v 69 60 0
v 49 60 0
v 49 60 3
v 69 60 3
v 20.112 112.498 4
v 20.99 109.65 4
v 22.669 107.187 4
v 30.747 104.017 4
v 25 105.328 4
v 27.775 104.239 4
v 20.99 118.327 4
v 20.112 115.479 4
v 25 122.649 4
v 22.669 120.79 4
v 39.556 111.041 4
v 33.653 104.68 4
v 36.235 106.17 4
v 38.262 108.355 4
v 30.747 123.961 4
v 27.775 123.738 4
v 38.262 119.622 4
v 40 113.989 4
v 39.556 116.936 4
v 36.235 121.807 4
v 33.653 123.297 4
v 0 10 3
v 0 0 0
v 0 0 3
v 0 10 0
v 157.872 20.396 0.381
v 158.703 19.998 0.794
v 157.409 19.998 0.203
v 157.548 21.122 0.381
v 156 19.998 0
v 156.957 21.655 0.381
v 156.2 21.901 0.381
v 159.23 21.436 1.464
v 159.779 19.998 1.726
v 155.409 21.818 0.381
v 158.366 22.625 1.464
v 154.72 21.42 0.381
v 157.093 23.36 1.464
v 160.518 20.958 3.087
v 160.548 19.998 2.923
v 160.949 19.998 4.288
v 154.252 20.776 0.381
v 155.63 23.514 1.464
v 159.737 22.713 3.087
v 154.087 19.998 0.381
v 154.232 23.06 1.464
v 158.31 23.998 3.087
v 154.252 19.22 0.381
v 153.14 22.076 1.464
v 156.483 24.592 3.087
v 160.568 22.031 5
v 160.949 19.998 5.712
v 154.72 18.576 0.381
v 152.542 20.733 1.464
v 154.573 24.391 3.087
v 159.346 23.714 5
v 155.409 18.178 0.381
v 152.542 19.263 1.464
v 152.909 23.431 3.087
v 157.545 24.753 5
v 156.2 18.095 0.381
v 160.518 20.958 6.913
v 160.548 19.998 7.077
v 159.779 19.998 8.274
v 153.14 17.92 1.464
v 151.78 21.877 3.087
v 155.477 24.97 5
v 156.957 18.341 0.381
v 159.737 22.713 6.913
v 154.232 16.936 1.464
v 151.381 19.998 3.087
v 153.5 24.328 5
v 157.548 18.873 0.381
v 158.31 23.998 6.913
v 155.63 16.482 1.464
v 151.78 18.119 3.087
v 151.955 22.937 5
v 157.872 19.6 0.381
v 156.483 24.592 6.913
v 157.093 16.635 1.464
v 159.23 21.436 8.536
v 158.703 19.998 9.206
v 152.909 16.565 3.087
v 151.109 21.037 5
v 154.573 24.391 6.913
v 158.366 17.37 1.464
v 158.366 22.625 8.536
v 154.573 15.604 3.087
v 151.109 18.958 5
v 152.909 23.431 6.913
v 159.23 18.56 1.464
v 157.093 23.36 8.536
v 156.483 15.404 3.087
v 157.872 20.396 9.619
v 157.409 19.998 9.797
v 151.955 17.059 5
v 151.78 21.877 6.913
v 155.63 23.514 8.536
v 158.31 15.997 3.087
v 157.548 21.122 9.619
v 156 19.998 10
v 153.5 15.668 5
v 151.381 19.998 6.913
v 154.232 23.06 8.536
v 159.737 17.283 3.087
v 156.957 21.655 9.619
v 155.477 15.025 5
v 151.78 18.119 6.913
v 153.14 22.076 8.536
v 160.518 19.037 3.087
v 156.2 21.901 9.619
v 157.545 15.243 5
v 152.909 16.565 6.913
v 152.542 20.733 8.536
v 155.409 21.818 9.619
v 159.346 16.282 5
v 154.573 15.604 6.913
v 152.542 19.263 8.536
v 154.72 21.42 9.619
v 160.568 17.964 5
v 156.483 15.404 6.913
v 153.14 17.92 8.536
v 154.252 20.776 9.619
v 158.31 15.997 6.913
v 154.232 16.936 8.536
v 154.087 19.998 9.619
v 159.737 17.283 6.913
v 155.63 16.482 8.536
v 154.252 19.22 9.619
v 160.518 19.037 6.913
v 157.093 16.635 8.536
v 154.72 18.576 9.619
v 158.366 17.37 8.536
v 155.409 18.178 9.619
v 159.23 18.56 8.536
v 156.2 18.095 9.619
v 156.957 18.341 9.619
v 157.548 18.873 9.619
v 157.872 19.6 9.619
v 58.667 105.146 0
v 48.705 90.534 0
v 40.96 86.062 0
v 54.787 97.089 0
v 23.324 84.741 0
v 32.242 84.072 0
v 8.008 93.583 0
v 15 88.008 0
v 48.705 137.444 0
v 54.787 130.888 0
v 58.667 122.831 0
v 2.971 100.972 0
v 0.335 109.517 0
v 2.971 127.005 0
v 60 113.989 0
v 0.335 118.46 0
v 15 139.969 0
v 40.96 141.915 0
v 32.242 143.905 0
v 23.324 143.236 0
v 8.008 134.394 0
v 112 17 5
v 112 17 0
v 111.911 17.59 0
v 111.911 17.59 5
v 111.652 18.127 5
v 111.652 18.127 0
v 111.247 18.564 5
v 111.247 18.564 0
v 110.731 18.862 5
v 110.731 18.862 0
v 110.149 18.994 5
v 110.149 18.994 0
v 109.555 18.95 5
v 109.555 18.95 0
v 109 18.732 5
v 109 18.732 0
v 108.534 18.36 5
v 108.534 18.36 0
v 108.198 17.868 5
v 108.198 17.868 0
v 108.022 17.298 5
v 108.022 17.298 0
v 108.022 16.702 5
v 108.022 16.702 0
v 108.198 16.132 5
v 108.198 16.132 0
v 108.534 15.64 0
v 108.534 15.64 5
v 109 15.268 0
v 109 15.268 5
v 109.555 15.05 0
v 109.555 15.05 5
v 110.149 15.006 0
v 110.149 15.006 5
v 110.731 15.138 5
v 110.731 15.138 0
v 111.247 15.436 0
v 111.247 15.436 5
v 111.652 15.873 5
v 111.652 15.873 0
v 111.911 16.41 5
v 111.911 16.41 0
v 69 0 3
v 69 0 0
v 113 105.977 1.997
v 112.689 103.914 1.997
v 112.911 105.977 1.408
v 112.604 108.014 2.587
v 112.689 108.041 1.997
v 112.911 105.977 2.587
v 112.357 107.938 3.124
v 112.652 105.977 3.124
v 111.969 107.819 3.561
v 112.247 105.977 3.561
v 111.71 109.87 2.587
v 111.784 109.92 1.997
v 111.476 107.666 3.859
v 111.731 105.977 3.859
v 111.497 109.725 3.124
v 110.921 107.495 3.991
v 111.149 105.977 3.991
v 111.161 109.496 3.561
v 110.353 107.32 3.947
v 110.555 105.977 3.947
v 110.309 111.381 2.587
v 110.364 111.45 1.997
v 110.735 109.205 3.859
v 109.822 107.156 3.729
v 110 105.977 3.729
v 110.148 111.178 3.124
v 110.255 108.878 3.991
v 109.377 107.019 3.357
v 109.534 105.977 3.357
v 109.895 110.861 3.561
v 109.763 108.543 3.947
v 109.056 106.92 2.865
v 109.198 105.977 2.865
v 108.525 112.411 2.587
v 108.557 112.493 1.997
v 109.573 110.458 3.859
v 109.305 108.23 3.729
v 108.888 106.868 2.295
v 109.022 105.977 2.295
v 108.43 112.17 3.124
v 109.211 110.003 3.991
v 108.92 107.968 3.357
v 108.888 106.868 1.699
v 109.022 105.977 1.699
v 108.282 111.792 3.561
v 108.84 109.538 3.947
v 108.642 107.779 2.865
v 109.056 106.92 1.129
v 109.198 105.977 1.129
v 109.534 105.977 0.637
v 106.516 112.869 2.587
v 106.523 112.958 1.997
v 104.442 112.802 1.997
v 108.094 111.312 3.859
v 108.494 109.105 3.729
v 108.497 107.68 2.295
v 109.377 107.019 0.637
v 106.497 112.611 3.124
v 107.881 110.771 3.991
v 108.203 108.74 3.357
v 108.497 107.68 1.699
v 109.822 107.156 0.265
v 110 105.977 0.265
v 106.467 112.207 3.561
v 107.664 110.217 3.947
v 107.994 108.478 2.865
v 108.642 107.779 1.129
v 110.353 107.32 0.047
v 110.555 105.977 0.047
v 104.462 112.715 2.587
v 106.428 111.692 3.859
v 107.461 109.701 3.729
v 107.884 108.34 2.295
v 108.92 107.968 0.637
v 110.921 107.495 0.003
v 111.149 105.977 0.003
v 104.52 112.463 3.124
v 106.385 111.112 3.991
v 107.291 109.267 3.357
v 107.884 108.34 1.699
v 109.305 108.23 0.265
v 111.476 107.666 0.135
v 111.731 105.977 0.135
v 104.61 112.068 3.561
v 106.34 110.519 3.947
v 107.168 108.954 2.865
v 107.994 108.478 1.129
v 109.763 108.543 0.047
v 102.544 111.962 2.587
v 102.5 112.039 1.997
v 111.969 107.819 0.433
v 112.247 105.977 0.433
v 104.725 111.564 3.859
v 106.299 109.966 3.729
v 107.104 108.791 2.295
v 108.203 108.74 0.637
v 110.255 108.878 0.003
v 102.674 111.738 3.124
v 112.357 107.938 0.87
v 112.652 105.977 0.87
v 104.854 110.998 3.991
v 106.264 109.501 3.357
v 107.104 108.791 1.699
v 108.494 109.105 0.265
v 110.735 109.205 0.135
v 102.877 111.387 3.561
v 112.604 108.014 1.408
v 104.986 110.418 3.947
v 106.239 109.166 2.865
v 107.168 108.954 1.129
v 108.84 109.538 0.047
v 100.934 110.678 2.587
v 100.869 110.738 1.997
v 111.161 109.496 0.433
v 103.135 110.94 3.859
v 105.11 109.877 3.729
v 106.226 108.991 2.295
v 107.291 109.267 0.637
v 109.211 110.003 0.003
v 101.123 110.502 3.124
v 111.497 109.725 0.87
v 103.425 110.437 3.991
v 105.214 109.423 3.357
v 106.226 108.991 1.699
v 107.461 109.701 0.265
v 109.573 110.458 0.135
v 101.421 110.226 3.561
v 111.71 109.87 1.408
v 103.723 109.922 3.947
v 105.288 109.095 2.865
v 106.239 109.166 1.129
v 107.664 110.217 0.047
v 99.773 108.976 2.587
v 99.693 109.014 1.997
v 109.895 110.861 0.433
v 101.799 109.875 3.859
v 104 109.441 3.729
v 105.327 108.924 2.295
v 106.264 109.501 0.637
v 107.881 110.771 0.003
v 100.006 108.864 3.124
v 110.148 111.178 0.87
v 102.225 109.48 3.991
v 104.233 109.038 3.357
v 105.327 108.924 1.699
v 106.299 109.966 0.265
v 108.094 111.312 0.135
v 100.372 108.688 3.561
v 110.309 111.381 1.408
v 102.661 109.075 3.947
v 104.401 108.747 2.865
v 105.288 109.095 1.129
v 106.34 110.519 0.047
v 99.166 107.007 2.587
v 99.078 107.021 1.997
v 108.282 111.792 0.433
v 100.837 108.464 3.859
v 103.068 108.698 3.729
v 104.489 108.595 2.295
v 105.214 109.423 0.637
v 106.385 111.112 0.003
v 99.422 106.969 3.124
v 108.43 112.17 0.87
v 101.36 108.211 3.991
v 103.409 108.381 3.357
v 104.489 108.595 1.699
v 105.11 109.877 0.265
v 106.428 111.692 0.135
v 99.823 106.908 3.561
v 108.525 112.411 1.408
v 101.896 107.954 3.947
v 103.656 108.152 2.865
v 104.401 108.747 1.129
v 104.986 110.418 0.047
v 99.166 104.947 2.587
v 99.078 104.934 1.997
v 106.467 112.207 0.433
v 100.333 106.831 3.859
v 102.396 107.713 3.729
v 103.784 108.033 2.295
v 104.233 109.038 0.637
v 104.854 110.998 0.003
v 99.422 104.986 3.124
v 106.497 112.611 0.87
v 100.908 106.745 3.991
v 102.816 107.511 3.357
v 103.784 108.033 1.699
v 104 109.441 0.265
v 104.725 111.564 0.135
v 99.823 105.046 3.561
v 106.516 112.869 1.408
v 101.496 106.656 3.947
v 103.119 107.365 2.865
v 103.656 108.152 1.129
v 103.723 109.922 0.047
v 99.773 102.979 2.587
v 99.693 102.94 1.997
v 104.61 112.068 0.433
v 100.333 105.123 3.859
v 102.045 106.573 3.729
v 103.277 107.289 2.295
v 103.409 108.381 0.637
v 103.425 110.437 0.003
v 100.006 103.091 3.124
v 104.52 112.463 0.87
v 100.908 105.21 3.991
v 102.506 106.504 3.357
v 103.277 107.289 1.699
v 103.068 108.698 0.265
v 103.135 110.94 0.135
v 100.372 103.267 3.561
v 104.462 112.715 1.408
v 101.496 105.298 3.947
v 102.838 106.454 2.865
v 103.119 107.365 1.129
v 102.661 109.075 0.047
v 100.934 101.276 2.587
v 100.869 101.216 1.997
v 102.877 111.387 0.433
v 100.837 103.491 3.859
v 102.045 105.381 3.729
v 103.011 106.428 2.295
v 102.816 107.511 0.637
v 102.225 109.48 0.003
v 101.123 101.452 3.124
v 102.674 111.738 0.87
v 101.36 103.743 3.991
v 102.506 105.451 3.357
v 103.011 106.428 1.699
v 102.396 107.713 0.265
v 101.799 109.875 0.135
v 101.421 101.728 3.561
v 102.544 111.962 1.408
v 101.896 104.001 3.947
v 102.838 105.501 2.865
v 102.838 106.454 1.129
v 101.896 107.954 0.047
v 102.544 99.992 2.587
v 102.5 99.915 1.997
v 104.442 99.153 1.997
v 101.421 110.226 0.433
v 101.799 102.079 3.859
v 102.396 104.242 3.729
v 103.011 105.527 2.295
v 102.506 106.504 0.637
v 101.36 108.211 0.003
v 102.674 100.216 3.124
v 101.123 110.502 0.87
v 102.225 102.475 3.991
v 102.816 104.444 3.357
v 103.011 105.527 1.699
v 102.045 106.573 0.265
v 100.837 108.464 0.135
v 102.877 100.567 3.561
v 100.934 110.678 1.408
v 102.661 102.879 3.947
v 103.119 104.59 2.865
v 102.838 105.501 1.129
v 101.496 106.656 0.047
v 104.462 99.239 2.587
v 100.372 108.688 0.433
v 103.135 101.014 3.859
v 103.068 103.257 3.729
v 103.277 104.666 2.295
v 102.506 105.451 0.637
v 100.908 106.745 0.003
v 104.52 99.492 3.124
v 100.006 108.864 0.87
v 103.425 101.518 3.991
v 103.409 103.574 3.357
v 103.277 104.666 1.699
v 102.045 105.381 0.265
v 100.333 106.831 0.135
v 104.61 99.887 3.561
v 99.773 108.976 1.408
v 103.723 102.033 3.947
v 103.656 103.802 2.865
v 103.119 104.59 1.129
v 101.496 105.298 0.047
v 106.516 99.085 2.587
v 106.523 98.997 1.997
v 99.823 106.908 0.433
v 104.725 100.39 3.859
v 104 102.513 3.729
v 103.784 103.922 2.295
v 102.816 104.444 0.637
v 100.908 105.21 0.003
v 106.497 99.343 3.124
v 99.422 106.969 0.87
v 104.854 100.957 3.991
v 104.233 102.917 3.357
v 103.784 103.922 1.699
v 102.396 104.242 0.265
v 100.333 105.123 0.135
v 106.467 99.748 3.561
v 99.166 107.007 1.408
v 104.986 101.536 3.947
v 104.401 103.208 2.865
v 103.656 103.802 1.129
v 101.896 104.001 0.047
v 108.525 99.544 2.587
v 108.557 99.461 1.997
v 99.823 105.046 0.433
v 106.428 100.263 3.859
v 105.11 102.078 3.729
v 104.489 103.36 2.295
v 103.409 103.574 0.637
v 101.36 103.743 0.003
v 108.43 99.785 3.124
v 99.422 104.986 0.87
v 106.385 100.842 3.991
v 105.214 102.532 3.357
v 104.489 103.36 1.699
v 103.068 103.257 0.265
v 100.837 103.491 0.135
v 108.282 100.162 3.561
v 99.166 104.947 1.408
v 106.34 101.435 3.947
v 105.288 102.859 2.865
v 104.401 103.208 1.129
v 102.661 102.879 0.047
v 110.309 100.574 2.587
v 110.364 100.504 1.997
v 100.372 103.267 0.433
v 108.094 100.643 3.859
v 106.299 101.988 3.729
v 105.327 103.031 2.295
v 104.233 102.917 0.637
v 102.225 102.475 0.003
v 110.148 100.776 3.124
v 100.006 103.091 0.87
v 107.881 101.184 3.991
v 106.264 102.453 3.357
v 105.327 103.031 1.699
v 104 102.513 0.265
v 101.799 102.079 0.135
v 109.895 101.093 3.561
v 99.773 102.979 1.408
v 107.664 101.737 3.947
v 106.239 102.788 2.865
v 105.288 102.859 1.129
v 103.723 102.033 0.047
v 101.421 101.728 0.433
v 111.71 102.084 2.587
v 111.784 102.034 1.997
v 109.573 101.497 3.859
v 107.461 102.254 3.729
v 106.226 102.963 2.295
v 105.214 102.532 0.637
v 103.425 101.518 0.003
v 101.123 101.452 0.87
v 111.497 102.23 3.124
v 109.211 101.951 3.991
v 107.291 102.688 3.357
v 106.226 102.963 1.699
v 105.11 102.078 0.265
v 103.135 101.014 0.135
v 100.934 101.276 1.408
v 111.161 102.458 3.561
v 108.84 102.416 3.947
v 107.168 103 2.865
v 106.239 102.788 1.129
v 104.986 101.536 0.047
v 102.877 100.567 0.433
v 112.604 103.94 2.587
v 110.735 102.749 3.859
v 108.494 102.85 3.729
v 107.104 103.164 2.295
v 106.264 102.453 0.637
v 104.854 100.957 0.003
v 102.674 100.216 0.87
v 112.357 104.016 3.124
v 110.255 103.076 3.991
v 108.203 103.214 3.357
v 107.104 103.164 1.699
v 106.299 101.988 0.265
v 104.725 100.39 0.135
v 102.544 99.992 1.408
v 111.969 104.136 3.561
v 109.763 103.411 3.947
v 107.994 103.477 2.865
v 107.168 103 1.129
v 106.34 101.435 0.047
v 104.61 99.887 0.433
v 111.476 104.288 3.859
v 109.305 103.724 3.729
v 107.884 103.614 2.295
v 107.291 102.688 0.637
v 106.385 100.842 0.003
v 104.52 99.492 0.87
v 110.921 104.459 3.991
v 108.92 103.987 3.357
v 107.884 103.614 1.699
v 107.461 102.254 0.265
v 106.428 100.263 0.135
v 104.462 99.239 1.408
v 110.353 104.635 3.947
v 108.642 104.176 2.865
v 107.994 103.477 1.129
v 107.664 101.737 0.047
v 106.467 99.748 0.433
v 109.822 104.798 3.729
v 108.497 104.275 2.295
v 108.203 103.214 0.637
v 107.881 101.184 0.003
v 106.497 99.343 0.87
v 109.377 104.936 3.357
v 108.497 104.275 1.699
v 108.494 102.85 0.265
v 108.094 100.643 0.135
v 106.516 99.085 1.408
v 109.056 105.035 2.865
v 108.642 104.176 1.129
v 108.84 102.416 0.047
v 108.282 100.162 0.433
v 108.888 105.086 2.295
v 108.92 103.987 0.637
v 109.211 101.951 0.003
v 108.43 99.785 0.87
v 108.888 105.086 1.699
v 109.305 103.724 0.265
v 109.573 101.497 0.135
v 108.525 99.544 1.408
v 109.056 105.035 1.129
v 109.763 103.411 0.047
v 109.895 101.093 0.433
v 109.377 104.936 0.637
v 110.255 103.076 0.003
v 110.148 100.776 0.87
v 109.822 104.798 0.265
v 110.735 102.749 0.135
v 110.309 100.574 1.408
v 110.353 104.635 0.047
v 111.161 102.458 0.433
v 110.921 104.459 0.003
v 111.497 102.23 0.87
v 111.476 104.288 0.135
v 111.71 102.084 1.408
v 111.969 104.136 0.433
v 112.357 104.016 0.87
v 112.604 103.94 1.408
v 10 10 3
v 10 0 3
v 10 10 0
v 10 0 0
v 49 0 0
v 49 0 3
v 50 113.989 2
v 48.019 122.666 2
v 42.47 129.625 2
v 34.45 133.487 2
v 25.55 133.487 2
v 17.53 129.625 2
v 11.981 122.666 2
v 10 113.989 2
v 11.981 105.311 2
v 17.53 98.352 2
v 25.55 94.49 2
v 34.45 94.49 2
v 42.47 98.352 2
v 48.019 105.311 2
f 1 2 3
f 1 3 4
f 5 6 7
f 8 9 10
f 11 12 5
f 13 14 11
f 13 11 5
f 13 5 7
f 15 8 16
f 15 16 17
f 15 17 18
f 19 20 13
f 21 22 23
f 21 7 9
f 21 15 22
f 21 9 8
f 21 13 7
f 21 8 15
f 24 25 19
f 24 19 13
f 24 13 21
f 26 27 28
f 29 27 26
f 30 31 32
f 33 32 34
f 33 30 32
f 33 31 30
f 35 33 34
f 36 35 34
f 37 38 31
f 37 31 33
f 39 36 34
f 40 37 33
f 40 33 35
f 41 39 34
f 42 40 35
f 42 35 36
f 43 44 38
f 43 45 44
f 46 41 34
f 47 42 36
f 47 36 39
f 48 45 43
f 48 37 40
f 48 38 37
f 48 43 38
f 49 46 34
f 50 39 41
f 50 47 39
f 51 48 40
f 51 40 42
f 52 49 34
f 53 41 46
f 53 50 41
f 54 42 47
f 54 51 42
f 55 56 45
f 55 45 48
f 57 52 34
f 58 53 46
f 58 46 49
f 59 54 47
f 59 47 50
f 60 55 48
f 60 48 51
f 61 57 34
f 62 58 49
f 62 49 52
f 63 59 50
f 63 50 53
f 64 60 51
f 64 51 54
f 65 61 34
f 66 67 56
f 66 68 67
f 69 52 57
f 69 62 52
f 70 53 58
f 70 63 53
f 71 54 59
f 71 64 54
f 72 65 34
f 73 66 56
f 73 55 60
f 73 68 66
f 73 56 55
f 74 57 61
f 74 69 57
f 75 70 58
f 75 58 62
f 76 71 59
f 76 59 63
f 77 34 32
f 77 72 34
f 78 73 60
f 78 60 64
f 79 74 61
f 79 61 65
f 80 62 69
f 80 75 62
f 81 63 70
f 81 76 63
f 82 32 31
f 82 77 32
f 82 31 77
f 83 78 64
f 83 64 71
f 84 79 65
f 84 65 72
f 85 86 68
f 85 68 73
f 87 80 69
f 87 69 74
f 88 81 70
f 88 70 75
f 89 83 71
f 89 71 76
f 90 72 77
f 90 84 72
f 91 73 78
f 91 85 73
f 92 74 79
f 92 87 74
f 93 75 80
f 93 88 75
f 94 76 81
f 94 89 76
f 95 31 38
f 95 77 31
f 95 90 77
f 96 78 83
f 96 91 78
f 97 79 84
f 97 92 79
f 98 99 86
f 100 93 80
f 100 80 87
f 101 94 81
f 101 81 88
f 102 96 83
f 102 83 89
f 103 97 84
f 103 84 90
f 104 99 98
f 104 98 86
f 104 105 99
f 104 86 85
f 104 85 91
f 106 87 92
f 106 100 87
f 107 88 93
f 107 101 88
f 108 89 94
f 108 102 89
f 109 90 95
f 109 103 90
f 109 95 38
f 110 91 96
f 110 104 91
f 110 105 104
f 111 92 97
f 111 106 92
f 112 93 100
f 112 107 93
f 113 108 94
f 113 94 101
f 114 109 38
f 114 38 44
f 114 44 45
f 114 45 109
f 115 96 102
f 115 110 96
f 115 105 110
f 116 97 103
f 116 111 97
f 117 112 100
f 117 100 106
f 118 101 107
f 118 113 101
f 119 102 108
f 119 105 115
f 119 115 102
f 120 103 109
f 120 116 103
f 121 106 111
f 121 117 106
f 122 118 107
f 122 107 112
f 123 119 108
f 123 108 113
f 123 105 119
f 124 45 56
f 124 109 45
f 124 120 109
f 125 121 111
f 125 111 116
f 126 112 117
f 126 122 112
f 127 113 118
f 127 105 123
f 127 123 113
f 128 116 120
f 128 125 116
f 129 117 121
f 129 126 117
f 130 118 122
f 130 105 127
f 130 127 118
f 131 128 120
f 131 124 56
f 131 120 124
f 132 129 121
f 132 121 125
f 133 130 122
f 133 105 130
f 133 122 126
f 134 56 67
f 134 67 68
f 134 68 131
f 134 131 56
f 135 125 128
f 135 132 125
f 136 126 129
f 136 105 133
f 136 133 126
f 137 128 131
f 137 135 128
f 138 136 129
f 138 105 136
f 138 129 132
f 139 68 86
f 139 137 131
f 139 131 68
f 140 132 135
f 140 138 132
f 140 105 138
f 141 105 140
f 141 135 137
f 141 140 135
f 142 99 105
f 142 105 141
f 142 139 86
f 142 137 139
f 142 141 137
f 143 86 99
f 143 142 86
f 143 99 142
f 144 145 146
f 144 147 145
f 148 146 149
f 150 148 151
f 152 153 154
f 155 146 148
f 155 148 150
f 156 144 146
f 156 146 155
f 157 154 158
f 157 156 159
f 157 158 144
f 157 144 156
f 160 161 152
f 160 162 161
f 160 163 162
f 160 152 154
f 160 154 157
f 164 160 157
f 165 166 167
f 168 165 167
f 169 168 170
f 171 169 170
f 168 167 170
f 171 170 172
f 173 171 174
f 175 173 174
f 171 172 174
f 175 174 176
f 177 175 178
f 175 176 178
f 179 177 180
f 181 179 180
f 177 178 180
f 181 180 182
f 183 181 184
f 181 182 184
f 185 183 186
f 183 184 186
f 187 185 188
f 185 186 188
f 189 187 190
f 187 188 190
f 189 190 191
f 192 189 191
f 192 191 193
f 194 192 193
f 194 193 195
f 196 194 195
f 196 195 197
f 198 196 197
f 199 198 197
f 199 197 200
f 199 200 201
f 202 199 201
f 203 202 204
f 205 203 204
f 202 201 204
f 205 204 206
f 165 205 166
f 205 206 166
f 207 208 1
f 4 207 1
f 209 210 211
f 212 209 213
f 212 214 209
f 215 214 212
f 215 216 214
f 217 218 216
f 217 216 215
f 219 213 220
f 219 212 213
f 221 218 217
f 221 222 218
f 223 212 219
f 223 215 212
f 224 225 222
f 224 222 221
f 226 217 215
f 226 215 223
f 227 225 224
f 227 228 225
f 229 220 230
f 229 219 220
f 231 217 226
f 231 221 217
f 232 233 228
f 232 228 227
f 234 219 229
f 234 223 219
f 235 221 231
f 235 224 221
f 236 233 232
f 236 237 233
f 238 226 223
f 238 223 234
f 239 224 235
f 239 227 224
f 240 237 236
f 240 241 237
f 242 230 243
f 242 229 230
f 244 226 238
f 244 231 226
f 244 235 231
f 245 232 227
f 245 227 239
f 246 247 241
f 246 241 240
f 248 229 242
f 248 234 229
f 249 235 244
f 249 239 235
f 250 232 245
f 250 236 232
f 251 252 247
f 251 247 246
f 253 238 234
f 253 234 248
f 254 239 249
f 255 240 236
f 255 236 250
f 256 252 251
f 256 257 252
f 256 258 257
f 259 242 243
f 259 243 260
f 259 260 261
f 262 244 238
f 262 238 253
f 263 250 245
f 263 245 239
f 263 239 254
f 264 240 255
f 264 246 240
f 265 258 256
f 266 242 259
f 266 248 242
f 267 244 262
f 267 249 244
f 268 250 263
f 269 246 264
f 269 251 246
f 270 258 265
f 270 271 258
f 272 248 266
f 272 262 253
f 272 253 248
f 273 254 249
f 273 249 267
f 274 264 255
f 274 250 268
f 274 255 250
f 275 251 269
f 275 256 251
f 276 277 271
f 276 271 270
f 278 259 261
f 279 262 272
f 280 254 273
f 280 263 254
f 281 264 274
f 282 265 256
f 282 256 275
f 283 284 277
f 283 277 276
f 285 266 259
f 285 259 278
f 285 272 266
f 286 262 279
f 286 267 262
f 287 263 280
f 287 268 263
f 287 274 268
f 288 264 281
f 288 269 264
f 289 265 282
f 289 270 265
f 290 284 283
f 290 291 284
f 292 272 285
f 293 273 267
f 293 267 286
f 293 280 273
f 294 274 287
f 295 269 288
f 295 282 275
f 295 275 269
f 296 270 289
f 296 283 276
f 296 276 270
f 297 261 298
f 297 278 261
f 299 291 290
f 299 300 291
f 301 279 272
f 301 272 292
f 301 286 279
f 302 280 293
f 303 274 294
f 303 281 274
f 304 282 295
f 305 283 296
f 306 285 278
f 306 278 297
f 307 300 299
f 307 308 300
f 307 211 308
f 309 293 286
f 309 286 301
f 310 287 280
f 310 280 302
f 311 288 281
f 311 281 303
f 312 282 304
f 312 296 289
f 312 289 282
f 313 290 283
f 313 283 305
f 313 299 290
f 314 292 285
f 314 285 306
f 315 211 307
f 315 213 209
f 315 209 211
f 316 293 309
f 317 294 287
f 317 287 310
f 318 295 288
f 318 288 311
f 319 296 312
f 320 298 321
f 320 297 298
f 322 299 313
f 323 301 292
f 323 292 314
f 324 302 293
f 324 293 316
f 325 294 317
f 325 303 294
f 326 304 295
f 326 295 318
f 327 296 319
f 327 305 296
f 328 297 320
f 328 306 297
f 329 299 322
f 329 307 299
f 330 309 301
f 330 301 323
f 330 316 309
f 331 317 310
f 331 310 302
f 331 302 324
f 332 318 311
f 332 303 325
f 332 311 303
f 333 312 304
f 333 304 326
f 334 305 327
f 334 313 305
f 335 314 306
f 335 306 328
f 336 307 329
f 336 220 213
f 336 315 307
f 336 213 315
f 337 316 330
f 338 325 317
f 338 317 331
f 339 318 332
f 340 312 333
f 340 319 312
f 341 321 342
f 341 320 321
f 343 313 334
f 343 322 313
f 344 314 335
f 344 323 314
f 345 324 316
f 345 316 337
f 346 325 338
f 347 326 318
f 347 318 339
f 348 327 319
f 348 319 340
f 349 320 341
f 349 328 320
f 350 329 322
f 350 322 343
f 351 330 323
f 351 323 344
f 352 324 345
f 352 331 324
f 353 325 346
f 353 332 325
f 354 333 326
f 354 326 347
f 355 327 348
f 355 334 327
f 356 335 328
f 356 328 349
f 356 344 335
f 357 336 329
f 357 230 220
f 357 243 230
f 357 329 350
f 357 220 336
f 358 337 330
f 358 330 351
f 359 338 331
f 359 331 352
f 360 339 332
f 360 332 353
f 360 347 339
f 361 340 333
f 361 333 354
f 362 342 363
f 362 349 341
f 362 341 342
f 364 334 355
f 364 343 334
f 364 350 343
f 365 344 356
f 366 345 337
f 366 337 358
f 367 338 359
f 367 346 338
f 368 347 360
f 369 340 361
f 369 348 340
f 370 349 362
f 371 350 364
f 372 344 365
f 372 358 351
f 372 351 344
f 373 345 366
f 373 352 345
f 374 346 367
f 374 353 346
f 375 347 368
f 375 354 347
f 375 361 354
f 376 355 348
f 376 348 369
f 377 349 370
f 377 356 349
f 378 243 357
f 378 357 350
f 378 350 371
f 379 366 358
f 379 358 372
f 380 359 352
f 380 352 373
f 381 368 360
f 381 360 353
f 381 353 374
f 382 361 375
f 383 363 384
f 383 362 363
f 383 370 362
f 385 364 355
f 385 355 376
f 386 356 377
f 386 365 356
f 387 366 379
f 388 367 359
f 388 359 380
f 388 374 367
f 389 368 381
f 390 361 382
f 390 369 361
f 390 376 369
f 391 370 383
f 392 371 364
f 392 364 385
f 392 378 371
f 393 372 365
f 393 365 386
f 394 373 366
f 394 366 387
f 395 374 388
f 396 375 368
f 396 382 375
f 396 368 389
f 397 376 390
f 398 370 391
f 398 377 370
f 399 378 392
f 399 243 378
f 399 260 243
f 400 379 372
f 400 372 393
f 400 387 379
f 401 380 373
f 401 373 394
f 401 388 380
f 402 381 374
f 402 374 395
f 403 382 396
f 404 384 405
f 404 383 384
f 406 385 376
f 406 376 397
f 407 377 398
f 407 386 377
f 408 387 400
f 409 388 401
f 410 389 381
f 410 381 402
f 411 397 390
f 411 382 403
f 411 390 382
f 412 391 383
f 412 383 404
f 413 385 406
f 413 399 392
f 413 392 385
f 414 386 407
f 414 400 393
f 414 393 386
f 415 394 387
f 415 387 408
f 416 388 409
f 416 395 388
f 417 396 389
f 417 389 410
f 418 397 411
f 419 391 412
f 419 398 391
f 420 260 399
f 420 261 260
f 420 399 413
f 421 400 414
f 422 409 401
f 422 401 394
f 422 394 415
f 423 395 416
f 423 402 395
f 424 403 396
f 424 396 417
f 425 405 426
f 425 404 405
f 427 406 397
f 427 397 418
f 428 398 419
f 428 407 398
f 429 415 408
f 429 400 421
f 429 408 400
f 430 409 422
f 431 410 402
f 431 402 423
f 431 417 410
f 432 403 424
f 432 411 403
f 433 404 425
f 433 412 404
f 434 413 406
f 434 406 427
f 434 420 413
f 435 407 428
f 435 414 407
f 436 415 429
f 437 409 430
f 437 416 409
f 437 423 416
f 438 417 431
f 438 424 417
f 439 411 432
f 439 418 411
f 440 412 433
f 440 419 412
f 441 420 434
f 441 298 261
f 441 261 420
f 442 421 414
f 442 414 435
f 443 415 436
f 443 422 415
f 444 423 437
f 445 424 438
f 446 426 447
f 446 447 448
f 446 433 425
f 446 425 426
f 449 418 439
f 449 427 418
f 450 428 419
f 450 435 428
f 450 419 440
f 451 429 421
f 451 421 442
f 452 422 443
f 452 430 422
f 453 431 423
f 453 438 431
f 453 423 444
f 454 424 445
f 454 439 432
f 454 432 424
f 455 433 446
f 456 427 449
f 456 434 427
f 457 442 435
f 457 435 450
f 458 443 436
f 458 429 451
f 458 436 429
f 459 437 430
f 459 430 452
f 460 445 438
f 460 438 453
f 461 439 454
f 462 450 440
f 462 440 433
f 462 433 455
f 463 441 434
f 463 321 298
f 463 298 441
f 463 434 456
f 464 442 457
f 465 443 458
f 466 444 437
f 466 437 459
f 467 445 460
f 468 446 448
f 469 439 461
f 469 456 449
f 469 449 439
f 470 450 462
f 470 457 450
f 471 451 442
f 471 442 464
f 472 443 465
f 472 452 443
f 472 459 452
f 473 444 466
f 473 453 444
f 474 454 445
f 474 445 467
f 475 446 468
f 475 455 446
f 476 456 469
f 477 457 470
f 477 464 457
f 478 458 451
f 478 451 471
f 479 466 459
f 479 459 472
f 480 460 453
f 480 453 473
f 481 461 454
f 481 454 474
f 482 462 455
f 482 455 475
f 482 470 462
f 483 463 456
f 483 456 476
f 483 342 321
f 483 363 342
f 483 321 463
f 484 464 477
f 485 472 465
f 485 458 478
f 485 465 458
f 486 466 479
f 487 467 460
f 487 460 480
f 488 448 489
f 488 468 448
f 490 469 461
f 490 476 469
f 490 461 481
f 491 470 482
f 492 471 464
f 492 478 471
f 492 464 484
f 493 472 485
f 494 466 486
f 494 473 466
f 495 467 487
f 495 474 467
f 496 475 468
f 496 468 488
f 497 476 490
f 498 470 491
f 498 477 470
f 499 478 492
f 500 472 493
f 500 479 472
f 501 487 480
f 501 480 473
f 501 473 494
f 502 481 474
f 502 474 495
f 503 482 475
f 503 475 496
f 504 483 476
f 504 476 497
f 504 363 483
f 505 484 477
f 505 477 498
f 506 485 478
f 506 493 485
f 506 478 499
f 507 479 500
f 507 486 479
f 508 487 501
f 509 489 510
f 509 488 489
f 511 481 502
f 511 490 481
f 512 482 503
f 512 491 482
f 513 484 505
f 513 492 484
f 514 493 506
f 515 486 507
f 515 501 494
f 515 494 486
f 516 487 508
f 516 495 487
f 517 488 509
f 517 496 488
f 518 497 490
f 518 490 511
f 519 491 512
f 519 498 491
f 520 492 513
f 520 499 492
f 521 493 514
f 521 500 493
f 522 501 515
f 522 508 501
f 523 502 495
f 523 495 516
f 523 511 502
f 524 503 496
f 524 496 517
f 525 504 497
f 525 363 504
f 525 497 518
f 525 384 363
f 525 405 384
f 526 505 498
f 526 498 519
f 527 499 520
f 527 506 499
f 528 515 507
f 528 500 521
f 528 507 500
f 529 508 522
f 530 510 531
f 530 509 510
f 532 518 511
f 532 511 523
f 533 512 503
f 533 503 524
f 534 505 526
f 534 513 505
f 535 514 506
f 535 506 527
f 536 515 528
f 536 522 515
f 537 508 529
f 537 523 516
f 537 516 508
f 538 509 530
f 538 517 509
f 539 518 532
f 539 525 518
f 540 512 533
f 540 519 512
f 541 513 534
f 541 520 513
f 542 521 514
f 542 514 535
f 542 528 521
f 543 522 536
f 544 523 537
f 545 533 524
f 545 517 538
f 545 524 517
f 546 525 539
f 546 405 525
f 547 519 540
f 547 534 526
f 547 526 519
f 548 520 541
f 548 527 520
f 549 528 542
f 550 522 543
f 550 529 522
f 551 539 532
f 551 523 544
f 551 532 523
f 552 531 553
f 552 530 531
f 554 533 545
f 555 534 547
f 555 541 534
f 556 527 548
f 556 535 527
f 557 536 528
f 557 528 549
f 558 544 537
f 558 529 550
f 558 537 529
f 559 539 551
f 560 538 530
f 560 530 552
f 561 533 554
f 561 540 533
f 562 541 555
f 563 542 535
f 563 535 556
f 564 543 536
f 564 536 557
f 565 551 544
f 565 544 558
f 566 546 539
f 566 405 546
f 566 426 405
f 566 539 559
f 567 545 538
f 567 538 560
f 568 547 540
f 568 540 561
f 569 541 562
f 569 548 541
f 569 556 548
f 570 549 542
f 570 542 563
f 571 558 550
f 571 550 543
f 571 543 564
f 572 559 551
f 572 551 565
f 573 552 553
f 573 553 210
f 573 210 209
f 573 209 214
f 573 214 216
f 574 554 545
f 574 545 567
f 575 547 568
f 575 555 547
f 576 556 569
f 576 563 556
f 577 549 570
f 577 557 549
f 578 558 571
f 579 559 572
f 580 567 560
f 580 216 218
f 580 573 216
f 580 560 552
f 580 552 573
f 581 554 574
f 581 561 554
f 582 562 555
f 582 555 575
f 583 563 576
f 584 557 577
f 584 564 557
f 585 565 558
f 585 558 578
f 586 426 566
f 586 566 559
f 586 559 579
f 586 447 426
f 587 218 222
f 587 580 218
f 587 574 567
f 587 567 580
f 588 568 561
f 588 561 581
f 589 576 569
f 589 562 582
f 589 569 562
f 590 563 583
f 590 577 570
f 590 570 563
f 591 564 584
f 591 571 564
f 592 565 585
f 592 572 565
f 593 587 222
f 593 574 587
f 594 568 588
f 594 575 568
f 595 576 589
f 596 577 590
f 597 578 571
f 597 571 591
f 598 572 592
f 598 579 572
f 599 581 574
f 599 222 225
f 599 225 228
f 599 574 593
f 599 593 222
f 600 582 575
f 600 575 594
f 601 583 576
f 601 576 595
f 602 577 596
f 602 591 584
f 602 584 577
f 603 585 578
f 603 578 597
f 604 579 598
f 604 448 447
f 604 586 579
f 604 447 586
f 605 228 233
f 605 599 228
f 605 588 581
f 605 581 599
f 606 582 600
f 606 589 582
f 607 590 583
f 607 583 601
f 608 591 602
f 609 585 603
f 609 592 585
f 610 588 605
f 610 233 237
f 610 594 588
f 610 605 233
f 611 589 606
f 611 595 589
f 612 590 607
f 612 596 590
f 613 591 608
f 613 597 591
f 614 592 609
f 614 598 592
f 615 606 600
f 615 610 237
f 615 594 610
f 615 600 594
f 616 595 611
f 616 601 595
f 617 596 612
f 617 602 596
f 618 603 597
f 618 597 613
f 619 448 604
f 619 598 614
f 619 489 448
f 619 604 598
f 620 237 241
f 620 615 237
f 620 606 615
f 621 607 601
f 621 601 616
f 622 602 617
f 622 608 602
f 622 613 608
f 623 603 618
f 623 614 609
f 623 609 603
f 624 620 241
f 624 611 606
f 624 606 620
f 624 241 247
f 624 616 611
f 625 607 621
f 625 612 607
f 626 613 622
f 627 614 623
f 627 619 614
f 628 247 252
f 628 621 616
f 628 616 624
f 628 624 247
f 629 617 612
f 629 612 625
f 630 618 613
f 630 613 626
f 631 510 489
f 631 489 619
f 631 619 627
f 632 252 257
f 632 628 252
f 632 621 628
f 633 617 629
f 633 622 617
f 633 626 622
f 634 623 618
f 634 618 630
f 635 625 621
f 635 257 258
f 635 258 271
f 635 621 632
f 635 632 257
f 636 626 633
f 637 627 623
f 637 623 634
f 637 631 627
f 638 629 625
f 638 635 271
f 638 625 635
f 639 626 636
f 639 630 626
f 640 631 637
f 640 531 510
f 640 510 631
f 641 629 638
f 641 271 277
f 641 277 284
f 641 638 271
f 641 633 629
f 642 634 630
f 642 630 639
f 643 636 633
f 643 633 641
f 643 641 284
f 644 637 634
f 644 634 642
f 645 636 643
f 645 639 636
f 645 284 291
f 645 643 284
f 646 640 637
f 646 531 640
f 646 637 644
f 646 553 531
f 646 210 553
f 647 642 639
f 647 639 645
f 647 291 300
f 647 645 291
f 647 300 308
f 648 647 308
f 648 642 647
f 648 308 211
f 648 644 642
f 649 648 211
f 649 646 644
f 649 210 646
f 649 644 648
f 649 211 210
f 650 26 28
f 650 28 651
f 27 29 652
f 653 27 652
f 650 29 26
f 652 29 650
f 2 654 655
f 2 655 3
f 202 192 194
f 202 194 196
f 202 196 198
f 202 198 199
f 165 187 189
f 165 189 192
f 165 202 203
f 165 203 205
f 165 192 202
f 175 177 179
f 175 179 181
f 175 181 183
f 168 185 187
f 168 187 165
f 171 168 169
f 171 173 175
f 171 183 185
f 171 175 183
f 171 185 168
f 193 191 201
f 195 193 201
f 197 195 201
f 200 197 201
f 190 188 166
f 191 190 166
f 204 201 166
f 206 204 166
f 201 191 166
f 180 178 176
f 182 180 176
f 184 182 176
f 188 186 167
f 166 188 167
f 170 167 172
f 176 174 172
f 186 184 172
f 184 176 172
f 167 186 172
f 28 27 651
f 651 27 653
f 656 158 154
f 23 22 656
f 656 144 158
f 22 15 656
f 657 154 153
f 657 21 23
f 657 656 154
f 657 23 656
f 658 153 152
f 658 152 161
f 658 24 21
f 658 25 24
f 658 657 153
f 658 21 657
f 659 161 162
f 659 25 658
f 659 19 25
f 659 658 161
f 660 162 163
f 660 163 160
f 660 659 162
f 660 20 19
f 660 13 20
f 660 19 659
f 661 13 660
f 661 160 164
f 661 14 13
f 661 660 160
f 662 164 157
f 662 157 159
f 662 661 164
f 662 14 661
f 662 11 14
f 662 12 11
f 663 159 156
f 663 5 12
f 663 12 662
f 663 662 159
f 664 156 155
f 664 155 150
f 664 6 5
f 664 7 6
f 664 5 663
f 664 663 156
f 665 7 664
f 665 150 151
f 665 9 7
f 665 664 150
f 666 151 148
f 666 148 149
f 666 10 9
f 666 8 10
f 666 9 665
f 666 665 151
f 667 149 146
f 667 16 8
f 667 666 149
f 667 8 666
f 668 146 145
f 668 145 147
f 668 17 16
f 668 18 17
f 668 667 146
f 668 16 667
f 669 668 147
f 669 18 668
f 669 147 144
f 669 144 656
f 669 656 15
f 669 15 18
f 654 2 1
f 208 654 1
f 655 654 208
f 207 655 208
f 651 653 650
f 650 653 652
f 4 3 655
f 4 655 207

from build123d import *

# Parameters (mm, degrees)
BOX_W          = 10
BOX_H          = 10
BOX_DEPTH      = 3
BOX001_W       = 20
BOX001_H       = 60
BOX001_DEPTH   = 3
CYLINDER_R     = 2
CYLINDER_DEPTH = 5
TORUS_R        = 2


with BuildPart() as cube:
    # Box → Box (new body)
    with BuildSketch(Plane.XY):
        with Locations((5, 5)):
            Rectangle(BOX_W, BOX_H)
    extrude(amount=BOX_DEPTH)


with BuildPart() as cube001:
    # Box001 → Box001 (new body)
    with BuildSketch(Plane(origin=(49, 0, 0), x_dir=(1, 0, 0), z_dir=(0, 0, 1))):
        with Locations((10, 30)):
            Rectangle(BOX001_W, BOX001_H)
    extrude(amount=BOX001_DEPTH)


with BuildPart() as cylinder:
    # Cylinder → Cylinder (new body)
    with BuildSketch(Plane(origin=(110, 17, 0), x_dir=(1, 0, 0), z_dir=(0, 0, 1))):
        Circle(CYLINDER_R)
    extrude(amount=CYLINDER_DEPTH)


with BuildPart() as sphere:
    # Sphere → Sphere (revolve)
    with BuildSketch(Plane(origin=(156, 19.997804, 5), x_dir=(1, 0, 0), z_dir=(0, -1, 0))):
        with BuildLine():
            ThreePointArc((0, -5), (5, 0), (0, 5))
            Line((0, 5), (0, -5))
        make_face()
    revolve(axis=Axis((156, 19.997804, 5), (0, 0, 1)))


with BuildPart() as cone:
    # Cone → Cone (revolve)
    with BuildSketch(Plane(origin=(30, 113.988609, 0), x_dir=(1, 0, 0), z_dir=(0, -1, 0))):
        Polygon((0, 0), (30, 0), (10, 4), (0, 4), align=None)
    revolve(axis=Axis((30, 113.988609, 0), (0, 0, 1)))


with BuildPart() as torus:
    # Torus → Torus (revolve)
    with BuildSketch(Plane(origin=(106, 105.977218, 1.997067), x_dir=(1, 0, 0), z_dir=(0, -1, 0))):
        with Locations((5, 0)):
            Circle(TORUS_R)
    revolve(axis=Axis((106, 105.977218, 1.997067), (0, 0, 1)))


solid = Compound([cube.part, cube001.part, cylinder.part, sphere.part, cone.part, torus.part])
